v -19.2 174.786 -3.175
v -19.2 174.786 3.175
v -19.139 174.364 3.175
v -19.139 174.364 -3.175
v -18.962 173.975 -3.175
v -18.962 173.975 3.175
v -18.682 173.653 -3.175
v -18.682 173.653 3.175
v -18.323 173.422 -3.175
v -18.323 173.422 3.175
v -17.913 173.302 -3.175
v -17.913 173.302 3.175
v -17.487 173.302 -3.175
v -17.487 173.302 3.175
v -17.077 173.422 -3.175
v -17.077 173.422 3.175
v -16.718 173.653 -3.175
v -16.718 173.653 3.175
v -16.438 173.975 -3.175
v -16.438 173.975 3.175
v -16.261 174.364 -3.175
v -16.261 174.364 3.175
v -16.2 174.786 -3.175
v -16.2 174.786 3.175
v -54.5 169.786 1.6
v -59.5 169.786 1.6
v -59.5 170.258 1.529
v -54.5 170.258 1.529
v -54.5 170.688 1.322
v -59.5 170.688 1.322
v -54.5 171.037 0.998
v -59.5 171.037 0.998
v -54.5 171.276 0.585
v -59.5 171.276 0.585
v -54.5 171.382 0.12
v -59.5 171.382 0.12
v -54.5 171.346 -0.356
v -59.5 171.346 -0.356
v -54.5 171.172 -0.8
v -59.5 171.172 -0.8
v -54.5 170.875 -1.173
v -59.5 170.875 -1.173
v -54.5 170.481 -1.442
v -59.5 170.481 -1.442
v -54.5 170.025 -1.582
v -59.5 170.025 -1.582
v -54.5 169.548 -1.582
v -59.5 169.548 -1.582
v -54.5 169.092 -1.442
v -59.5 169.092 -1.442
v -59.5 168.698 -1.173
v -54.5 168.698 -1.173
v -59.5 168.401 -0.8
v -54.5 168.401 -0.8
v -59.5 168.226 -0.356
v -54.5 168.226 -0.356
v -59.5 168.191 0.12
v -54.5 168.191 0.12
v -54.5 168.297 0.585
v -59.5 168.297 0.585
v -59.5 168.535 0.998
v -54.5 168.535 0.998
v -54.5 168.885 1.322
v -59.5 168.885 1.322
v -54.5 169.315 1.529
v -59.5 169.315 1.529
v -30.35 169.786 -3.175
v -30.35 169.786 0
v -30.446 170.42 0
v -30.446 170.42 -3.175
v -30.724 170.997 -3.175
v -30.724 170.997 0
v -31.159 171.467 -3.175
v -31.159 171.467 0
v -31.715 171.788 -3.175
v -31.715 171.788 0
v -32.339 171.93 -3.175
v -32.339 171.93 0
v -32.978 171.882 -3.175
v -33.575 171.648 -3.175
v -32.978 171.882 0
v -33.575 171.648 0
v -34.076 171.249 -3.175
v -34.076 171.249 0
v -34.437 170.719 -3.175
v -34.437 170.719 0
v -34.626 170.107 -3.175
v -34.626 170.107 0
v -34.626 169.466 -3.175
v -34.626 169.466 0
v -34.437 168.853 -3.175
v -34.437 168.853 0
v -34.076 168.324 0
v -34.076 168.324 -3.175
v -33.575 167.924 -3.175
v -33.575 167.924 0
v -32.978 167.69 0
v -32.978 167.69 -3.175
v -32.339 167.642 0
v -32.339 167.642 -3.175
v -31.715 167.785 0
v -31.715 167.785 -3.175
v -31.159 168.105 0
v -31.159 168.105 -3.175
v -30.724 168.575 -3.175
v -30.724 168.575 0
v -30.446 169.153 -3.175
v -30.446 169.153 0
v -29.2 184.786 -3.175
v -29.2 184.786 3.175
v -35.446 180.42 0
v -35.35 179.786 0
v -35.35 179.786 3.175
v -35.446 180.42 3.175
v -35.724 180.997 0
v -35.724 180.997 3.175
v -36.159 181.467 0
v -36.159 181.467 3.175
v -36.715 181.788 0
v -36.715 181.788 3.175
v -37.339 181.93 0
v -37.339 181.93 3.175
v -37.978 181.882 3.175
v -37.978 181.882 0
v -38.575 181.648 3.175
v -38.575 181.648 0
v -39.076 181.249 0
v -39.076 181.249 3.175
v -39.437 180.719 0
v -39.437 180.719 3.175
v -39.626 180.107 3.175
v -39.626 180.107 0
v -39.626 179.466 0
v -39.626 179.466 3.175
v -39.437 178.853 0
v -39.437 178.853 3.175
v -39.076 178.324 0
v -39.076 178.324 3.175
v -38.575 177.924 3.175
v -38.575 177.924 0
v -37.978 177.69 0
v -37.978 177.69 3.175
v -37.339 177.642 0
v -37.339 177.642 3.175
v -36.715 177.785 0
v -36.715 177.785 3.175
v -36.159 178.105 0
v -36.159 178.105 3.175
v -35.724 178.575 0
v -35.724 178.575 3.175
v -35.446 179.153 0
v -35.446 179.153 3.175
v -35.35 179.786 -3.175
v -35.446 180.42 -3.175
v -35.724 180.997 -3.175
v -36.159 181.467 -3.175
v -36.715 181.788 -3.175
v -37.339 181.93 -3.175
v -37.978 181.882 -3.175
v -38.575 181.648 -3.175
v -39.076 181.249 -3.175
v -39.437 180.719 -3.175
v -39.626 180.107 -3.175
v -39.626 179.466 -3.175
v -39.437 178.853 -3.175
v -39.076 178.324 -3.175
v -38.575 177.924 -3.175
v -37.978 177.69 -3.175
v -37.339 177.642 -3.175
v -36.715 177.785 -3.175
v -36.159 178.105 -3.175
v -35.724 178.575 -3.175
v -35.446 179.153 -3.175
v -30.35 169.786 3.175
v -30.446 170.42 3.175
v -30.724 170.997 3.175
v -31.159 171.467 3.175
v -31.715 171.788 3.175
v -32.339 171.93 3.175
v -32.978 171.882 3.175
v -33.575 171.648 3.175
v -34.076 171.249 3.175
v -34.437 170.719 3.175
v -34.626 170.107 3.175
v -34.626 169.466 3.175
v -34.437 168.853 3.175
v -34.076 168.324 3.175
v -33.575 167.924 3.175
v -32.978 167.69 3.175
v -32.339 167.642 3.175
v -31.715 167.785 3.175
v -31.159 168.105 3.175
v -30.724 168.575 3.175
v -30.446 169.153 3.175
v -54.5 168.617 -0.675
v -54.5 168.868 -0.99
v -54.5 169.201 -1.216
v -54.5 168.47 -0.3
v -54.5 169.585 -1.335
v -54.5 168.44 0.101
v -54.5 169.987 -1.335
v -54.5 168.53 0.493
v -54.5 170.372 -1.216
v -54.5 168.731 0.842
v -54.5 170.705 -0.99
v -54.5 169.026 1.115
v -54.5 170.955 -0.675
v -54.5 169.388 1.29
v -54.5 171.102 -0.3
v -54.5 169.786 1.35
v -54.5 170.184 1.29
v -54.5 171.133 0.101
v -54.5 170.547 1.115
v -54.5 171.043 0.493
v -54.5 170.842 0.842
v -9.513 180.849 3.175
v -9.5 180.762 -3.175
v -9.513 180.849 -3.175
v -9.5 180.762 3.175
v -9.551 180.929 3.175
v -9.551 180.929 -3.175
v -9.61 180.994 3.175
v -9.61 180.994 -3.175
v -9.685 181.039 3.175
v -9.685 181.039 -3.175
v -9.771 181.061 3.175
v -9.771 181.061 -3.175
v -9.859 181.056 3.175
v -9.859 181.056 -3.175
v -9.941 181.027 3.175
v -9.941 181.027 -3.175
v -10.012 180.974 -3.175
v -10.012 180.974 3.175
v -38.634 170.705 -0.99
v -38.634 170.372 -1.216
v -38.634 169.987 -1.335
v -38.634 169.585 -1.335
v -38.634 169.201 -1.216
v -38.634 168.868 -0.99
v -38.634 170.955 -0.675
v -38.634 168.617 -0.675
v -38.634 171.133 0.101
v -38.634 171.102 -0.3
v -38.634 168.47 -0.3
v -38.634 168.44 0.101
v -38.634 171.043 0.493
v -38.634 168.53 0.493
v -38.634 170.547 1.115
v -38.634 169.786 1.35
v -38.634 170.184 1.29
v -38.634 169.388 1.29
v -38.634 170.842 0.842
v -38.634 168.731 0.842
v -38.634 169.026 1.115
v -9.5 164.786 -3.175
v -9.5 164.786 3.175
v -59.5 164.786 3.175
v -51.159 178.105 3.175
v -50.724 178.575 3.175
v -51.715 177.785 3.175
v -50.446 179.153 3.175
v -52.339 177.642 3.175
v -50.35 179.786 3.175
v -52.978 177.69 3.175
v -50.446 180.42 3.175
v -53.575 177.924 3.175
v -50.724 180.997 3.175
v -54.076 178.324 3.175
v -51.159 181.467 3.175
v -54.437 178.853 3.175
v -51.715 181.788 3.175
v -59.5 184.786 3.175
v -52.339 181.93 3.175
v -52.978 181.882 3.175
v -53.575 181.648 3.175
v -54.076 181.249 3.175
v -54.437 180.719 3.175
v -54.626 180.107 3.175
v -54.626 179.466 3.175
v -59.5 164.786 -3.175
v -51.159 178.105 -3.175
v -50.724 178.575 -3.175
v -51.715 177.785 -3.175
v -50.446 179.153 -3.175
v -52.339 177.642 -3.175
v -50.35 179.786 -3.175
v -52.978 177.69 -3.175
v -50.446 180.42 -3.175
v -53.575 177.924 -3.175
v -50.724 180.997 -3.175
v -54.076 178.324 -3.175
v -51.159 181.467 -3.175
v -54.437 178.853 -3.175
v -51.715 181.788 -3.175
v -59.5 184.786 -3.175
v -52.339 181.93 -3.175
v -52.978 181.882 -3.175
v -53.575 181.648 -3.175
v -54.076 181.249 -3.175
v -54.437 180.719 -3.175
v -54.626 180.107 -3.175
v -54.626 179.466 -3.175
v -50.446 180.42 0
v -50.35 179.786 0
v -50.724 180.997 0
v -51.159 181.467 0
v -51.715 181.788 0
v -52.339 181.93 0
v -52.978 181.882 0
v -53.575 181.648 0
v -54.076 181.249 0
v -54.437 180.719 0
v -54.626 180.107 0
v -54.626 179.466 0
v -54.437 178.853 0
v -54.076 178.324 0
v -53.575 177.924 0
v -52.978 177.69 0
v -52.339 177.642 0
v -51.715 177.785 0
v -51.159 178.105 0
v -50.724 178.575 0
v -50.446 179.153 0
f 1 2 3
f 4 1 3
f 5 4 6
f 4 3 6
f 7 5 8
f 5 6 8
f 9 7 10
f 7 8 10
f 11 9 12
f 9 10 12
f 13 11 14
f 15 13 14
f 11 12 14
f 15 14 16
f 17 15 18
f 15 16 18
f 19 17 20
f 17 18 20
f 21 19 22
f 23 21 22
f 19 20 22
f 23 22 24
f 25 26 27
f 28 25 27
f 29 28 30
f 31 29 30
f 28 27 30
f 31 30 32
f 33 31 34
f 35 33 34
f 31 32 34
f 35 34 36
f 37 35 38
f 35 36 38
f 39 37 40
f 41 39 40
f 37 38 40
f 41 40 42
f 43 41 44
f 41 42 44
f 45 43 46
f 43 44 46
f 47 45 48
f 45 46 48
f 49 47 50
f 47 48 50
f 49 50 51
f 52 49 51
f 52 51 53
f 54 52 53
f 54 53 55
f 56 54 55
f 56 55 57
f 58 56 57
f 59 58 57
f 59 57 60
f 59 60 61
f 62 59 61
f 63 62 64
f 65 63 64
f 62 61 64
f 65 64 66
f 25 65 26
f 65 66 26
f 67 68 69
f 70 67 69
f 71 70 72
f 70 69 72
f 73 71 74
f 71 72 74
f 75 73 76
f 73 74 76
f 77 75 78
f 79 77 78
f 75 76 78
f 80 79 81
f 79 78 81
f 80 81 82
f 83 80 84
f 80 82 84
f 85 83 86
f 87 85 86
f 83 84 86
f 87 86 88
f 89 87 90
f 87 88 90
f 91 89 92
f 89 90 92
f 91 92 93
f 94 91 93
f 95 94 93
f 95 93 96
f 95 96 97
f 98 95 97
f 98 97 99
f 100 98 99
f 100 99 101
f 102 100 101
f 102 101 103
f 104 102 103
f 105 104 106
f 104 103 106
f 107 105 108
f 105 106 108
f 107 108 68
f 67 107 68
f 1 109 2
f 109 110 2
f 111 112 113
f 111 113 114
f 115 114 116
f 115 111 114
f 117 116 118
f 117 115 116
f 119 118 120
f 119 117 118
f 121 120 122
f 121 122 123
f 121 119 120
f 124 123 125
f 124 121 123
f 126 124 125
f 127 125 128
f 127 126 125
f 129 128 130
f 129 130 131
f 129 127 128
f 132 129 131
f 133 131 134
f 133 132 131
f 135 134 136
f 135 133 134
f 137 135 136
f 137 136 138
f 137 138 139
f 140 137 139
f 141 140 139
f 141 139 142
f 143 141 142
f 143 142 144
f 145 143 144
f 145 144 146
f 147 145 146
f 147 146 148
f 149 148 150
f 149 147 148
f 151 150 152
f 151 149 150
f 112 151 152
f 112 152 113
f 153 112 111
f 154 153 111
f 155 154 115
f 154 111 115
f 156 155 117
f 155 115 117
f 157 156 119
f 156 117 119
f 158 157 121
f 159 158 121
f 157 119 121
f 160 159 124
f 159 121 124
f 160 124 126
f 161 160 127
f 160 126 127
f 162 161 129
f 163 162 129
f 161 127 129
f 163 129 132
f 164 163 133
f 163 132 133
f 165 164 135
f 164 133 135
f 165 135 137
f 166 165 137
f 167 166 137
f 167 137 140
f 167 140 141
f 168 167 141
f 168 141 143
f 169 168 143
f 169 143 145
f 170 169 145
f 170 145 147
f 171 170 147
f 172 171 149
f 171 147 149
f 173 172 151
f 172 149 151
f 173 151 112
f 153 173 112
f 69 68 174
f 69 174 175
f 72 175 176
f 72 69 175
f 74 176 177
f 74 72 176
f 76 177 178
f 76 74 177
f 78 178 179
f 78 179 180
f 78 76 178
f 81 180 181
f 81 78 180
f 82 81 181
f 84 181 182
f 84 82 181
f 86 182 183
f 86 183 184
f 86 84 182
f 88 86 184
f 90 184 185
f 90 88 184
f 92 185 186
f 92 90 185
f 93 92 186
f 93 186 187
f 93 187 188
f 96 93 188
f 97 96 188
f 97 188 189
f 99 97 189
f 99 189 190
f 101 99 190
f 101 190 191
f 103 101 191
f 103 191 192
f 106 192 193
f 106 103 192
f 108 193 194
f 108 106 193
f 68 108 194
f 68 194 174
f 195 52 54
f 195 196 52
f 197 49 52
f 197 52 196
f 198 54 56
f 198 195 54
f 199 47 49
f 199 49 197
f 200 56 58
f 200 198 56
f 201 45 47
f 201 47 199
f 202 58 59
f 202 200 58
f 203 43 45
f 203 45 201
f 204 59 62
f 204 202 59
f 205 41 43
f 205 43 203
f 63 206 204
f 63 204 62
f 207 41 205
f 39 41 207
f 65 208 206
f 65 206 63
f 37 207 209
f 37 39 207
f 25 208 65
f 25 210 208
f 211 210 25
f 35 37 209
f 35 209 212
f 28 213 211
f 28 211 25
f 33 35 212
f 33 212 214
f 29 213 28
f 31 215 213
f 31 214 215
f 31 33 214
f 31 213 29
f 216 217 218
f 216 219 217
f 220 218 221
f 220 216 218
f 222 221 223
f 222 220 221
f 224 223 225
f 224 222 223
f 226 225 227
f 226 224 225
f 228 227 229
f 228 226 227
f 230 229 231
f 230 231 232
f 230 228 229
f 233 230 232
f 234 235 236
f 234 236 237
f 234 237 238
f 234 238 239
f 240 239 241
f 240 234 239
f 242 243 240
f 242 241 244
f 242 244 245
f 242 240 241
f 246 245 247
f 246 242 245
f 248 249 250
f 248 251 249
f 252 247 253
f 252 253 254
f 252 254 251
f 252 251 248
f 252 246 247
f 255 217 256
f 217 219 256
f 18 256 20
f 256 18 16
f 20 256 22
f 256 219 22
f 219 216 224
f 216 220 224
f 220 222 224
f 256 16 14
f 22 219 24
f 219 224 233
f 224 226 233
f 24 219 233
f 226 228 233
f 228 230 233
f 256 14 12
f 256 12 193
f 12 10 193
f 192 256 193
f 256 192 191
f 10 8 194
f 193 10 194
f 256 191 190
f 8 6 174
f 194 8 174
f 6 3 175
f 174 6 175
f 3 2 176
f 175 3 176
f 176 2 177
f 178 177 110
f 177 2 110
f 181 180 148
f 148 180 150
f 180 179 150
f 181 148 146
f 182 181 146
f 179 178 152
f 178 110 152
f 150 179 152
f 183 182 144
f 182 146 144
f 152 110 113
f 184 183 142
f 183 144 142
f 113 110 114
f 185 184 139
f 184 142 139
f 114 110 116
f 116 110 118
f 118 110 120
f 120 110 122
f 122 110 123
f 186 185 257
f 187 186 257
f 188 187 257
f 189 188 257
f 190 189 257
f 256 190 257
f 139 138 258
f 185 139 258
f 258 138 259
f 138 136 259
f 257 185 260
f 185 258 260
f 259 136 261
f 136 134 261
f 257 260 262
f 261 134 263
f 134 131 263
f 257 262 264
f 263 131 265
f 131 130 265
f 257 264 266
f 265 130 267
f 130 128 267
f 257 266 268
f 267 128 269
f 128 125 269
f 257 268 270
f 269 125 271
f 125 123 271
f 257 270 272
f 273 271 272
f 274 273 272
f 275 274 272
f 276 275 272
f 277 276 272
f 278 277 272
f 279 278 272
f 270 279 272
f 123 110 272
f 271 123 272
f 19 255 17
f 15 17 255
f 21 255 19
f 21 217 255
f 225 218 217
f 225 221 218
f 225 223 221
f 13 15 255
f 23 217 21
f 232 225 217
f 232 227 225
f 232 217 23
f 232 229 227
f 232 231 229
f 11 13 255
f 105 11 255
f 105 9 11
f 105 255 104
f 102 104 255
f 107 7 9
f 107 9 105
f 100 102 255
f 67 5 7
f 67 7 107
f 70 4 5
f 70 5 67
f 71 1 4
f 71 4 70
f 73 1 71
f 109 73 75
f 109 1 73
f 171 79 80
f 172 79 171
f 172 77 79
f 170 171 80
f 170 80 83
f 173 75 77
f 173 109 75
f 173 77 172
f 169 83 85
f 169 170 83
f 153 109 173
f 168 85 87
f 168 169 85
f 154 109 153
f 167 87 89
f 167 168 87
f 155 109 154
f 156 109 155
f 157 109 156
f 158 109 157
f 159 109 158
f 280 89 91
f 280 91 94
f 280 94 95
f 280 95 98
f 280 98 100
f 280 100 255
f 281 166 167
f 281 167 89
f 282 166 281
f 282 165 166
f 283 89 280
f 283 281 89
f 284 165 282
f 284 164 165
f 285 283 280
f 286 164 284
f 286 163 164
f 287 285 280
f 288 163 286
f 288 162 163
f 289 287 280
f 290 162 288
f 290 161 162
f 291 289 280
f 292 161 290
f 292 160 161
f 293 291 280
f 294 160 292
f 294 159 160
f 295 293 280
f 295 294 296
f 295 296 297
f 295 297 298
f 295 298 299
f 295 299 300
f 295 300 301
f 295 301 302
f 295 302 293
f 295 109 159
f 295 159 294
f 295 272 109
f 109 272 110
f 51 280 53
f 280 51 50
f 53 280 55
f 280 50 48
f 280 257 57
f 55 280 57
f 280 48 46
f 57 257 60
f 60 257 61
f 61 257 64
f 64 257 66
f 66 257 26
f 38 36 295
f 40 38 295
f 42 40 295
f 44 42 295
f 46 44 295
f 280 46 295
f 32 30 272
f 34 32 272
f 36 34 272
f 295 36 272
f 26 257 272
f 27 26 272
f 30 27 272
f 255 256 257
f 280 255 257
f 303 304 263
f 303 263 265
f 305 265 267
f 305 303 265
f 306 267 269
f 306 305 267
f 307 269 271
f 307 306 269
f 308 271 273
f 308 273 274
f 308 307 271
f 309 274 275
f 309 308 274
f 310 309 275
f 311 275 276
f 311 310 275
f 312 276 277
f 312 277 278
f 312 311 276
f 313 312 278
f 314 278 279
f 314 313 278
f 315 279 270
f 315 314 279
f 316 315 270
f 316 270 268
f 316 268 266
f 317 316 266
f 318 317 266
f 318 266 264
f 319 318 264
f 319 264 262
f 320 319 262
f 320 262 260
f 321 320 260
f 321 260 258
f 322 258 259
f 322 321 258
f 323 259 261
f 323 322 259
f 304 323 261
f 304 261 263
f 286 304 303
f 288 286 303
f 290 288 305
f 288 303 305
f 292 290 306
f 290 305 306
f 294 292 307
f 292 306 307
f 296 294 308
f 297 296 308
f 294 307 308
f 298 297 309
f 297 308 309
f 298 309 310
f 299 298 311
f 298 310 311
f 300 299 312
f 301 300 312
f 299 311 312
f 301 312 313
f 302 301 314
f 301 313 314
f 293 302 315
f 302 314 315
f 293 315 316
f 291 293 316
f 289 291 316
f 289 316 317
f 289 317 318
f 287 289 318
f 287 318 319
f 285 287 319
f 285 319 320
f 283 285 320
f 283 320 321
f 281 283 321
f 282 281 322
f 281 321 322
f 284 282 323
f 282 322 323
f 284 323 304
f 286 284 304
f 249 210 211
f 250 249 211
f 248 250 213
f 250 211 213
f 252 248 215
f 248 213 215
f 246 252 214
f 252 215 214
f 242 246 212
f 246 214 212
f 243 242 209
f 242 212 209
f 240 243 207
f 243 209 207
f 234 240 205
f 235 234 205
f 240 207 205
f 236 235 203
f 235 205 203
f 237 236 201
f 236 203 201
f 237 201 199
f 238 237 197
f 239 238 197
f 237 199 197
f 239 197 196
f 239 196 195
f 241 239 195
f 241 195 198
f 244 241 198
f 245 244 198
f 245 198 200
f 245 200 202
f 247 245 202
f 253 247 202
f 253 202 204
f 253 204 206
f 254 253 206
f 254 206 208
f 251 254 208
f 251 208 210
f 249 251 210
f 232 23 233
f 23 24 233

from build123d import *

# Parameters (mm, degrees)
SKETCH1_R                = 2.15
BOSS_EXTRUDE1_DEPTH      = 3.175
BOSS_EXTRUDE1_DEPTH_BACK = 3.175
SKETCH2_R                = 1.35
CUT_EXTRUDE1_DEPTH       = 20.866025
SKETCH3_R                = 1.6
CUT_EXTRUDE2_DEPTH       = 5
FILLET1_R                = 0.3


with BuildPart() as part:
    # Sketch1 → Boss-Extrude1 (new body, two sides)
    with BuildSketch(Plane.XY) as boss_extrude1_sk:
        with BuildLine():
            Line((-9.5, 164.786291501), (-59.5, 164.786291501))
            Line((-59.5, 164.786291501), (-59.5, 184.786291501))
            Line((-59.5, 184.786291501), (-29.2, 184.786291501))
            Line((-29.2, 184.786291501), (-19.2, 174.786291501))
            ThreePointArc((-19.2, 174.786291501), (-17.7, 173.286291501), (-16.2, 174.786291501))
            Line((-16.2, 174.786291501), (-9.5, 181.486291501))
            Line((-9.5, 181.486291501), (-9.5, 164.786291501))
        make_face()
        with Locations((-52.5, 179.786291501)):
            Circle(SKETCH1_R, mode=Mode.SUBTRACT)
        with Locations((-37.5, 179.786291501)):
            Circle(SKETCH1_R, mode=Mode.SUBTRACT)
        with Locations((-32.5, 169.786291501)):
            Circle(SKETCH1_R, mode=Mode.SUBTRACT)
    extrude(amount=BOSS_EXTRUDE1_DEPTH)
    extrude(boss_extrude1_sk.sketch, amount=-BOSS_EXTRUDE1_DEPTH_BACK)

    # Sketch2 → Cut-Extrude1 (cut)
    with BuildSketch(Plane.ZY.offset(59.5)):
        with Locations((0, 169.786291501)):
            Circle(SKETCH2_R)
    extrude(amount=-CUT_EXTRUDE1_DEPTH, mode=Mode.SUBTRACT)

    # Sketch3 → Cut-Extrude2 (cut)
    with BuildSketch(Plane.ZY.offset(59.5)):
        with Locations((0, 169.786291501)):
            Circle(SKETCH3_R)
    extrude(amount=-CUT_EXTRUDE2_DEPTH, mode=Mode.SUBTRACT)

    # Fillet1
    fillet1_edges = [part.edges().sort_by_distance(p)[0] for p in [
        (-9.5, 181.486291501, 0),
    ]]
    fillet(fillet1_edges, radius=FILLET1_R)


solid = part.part
